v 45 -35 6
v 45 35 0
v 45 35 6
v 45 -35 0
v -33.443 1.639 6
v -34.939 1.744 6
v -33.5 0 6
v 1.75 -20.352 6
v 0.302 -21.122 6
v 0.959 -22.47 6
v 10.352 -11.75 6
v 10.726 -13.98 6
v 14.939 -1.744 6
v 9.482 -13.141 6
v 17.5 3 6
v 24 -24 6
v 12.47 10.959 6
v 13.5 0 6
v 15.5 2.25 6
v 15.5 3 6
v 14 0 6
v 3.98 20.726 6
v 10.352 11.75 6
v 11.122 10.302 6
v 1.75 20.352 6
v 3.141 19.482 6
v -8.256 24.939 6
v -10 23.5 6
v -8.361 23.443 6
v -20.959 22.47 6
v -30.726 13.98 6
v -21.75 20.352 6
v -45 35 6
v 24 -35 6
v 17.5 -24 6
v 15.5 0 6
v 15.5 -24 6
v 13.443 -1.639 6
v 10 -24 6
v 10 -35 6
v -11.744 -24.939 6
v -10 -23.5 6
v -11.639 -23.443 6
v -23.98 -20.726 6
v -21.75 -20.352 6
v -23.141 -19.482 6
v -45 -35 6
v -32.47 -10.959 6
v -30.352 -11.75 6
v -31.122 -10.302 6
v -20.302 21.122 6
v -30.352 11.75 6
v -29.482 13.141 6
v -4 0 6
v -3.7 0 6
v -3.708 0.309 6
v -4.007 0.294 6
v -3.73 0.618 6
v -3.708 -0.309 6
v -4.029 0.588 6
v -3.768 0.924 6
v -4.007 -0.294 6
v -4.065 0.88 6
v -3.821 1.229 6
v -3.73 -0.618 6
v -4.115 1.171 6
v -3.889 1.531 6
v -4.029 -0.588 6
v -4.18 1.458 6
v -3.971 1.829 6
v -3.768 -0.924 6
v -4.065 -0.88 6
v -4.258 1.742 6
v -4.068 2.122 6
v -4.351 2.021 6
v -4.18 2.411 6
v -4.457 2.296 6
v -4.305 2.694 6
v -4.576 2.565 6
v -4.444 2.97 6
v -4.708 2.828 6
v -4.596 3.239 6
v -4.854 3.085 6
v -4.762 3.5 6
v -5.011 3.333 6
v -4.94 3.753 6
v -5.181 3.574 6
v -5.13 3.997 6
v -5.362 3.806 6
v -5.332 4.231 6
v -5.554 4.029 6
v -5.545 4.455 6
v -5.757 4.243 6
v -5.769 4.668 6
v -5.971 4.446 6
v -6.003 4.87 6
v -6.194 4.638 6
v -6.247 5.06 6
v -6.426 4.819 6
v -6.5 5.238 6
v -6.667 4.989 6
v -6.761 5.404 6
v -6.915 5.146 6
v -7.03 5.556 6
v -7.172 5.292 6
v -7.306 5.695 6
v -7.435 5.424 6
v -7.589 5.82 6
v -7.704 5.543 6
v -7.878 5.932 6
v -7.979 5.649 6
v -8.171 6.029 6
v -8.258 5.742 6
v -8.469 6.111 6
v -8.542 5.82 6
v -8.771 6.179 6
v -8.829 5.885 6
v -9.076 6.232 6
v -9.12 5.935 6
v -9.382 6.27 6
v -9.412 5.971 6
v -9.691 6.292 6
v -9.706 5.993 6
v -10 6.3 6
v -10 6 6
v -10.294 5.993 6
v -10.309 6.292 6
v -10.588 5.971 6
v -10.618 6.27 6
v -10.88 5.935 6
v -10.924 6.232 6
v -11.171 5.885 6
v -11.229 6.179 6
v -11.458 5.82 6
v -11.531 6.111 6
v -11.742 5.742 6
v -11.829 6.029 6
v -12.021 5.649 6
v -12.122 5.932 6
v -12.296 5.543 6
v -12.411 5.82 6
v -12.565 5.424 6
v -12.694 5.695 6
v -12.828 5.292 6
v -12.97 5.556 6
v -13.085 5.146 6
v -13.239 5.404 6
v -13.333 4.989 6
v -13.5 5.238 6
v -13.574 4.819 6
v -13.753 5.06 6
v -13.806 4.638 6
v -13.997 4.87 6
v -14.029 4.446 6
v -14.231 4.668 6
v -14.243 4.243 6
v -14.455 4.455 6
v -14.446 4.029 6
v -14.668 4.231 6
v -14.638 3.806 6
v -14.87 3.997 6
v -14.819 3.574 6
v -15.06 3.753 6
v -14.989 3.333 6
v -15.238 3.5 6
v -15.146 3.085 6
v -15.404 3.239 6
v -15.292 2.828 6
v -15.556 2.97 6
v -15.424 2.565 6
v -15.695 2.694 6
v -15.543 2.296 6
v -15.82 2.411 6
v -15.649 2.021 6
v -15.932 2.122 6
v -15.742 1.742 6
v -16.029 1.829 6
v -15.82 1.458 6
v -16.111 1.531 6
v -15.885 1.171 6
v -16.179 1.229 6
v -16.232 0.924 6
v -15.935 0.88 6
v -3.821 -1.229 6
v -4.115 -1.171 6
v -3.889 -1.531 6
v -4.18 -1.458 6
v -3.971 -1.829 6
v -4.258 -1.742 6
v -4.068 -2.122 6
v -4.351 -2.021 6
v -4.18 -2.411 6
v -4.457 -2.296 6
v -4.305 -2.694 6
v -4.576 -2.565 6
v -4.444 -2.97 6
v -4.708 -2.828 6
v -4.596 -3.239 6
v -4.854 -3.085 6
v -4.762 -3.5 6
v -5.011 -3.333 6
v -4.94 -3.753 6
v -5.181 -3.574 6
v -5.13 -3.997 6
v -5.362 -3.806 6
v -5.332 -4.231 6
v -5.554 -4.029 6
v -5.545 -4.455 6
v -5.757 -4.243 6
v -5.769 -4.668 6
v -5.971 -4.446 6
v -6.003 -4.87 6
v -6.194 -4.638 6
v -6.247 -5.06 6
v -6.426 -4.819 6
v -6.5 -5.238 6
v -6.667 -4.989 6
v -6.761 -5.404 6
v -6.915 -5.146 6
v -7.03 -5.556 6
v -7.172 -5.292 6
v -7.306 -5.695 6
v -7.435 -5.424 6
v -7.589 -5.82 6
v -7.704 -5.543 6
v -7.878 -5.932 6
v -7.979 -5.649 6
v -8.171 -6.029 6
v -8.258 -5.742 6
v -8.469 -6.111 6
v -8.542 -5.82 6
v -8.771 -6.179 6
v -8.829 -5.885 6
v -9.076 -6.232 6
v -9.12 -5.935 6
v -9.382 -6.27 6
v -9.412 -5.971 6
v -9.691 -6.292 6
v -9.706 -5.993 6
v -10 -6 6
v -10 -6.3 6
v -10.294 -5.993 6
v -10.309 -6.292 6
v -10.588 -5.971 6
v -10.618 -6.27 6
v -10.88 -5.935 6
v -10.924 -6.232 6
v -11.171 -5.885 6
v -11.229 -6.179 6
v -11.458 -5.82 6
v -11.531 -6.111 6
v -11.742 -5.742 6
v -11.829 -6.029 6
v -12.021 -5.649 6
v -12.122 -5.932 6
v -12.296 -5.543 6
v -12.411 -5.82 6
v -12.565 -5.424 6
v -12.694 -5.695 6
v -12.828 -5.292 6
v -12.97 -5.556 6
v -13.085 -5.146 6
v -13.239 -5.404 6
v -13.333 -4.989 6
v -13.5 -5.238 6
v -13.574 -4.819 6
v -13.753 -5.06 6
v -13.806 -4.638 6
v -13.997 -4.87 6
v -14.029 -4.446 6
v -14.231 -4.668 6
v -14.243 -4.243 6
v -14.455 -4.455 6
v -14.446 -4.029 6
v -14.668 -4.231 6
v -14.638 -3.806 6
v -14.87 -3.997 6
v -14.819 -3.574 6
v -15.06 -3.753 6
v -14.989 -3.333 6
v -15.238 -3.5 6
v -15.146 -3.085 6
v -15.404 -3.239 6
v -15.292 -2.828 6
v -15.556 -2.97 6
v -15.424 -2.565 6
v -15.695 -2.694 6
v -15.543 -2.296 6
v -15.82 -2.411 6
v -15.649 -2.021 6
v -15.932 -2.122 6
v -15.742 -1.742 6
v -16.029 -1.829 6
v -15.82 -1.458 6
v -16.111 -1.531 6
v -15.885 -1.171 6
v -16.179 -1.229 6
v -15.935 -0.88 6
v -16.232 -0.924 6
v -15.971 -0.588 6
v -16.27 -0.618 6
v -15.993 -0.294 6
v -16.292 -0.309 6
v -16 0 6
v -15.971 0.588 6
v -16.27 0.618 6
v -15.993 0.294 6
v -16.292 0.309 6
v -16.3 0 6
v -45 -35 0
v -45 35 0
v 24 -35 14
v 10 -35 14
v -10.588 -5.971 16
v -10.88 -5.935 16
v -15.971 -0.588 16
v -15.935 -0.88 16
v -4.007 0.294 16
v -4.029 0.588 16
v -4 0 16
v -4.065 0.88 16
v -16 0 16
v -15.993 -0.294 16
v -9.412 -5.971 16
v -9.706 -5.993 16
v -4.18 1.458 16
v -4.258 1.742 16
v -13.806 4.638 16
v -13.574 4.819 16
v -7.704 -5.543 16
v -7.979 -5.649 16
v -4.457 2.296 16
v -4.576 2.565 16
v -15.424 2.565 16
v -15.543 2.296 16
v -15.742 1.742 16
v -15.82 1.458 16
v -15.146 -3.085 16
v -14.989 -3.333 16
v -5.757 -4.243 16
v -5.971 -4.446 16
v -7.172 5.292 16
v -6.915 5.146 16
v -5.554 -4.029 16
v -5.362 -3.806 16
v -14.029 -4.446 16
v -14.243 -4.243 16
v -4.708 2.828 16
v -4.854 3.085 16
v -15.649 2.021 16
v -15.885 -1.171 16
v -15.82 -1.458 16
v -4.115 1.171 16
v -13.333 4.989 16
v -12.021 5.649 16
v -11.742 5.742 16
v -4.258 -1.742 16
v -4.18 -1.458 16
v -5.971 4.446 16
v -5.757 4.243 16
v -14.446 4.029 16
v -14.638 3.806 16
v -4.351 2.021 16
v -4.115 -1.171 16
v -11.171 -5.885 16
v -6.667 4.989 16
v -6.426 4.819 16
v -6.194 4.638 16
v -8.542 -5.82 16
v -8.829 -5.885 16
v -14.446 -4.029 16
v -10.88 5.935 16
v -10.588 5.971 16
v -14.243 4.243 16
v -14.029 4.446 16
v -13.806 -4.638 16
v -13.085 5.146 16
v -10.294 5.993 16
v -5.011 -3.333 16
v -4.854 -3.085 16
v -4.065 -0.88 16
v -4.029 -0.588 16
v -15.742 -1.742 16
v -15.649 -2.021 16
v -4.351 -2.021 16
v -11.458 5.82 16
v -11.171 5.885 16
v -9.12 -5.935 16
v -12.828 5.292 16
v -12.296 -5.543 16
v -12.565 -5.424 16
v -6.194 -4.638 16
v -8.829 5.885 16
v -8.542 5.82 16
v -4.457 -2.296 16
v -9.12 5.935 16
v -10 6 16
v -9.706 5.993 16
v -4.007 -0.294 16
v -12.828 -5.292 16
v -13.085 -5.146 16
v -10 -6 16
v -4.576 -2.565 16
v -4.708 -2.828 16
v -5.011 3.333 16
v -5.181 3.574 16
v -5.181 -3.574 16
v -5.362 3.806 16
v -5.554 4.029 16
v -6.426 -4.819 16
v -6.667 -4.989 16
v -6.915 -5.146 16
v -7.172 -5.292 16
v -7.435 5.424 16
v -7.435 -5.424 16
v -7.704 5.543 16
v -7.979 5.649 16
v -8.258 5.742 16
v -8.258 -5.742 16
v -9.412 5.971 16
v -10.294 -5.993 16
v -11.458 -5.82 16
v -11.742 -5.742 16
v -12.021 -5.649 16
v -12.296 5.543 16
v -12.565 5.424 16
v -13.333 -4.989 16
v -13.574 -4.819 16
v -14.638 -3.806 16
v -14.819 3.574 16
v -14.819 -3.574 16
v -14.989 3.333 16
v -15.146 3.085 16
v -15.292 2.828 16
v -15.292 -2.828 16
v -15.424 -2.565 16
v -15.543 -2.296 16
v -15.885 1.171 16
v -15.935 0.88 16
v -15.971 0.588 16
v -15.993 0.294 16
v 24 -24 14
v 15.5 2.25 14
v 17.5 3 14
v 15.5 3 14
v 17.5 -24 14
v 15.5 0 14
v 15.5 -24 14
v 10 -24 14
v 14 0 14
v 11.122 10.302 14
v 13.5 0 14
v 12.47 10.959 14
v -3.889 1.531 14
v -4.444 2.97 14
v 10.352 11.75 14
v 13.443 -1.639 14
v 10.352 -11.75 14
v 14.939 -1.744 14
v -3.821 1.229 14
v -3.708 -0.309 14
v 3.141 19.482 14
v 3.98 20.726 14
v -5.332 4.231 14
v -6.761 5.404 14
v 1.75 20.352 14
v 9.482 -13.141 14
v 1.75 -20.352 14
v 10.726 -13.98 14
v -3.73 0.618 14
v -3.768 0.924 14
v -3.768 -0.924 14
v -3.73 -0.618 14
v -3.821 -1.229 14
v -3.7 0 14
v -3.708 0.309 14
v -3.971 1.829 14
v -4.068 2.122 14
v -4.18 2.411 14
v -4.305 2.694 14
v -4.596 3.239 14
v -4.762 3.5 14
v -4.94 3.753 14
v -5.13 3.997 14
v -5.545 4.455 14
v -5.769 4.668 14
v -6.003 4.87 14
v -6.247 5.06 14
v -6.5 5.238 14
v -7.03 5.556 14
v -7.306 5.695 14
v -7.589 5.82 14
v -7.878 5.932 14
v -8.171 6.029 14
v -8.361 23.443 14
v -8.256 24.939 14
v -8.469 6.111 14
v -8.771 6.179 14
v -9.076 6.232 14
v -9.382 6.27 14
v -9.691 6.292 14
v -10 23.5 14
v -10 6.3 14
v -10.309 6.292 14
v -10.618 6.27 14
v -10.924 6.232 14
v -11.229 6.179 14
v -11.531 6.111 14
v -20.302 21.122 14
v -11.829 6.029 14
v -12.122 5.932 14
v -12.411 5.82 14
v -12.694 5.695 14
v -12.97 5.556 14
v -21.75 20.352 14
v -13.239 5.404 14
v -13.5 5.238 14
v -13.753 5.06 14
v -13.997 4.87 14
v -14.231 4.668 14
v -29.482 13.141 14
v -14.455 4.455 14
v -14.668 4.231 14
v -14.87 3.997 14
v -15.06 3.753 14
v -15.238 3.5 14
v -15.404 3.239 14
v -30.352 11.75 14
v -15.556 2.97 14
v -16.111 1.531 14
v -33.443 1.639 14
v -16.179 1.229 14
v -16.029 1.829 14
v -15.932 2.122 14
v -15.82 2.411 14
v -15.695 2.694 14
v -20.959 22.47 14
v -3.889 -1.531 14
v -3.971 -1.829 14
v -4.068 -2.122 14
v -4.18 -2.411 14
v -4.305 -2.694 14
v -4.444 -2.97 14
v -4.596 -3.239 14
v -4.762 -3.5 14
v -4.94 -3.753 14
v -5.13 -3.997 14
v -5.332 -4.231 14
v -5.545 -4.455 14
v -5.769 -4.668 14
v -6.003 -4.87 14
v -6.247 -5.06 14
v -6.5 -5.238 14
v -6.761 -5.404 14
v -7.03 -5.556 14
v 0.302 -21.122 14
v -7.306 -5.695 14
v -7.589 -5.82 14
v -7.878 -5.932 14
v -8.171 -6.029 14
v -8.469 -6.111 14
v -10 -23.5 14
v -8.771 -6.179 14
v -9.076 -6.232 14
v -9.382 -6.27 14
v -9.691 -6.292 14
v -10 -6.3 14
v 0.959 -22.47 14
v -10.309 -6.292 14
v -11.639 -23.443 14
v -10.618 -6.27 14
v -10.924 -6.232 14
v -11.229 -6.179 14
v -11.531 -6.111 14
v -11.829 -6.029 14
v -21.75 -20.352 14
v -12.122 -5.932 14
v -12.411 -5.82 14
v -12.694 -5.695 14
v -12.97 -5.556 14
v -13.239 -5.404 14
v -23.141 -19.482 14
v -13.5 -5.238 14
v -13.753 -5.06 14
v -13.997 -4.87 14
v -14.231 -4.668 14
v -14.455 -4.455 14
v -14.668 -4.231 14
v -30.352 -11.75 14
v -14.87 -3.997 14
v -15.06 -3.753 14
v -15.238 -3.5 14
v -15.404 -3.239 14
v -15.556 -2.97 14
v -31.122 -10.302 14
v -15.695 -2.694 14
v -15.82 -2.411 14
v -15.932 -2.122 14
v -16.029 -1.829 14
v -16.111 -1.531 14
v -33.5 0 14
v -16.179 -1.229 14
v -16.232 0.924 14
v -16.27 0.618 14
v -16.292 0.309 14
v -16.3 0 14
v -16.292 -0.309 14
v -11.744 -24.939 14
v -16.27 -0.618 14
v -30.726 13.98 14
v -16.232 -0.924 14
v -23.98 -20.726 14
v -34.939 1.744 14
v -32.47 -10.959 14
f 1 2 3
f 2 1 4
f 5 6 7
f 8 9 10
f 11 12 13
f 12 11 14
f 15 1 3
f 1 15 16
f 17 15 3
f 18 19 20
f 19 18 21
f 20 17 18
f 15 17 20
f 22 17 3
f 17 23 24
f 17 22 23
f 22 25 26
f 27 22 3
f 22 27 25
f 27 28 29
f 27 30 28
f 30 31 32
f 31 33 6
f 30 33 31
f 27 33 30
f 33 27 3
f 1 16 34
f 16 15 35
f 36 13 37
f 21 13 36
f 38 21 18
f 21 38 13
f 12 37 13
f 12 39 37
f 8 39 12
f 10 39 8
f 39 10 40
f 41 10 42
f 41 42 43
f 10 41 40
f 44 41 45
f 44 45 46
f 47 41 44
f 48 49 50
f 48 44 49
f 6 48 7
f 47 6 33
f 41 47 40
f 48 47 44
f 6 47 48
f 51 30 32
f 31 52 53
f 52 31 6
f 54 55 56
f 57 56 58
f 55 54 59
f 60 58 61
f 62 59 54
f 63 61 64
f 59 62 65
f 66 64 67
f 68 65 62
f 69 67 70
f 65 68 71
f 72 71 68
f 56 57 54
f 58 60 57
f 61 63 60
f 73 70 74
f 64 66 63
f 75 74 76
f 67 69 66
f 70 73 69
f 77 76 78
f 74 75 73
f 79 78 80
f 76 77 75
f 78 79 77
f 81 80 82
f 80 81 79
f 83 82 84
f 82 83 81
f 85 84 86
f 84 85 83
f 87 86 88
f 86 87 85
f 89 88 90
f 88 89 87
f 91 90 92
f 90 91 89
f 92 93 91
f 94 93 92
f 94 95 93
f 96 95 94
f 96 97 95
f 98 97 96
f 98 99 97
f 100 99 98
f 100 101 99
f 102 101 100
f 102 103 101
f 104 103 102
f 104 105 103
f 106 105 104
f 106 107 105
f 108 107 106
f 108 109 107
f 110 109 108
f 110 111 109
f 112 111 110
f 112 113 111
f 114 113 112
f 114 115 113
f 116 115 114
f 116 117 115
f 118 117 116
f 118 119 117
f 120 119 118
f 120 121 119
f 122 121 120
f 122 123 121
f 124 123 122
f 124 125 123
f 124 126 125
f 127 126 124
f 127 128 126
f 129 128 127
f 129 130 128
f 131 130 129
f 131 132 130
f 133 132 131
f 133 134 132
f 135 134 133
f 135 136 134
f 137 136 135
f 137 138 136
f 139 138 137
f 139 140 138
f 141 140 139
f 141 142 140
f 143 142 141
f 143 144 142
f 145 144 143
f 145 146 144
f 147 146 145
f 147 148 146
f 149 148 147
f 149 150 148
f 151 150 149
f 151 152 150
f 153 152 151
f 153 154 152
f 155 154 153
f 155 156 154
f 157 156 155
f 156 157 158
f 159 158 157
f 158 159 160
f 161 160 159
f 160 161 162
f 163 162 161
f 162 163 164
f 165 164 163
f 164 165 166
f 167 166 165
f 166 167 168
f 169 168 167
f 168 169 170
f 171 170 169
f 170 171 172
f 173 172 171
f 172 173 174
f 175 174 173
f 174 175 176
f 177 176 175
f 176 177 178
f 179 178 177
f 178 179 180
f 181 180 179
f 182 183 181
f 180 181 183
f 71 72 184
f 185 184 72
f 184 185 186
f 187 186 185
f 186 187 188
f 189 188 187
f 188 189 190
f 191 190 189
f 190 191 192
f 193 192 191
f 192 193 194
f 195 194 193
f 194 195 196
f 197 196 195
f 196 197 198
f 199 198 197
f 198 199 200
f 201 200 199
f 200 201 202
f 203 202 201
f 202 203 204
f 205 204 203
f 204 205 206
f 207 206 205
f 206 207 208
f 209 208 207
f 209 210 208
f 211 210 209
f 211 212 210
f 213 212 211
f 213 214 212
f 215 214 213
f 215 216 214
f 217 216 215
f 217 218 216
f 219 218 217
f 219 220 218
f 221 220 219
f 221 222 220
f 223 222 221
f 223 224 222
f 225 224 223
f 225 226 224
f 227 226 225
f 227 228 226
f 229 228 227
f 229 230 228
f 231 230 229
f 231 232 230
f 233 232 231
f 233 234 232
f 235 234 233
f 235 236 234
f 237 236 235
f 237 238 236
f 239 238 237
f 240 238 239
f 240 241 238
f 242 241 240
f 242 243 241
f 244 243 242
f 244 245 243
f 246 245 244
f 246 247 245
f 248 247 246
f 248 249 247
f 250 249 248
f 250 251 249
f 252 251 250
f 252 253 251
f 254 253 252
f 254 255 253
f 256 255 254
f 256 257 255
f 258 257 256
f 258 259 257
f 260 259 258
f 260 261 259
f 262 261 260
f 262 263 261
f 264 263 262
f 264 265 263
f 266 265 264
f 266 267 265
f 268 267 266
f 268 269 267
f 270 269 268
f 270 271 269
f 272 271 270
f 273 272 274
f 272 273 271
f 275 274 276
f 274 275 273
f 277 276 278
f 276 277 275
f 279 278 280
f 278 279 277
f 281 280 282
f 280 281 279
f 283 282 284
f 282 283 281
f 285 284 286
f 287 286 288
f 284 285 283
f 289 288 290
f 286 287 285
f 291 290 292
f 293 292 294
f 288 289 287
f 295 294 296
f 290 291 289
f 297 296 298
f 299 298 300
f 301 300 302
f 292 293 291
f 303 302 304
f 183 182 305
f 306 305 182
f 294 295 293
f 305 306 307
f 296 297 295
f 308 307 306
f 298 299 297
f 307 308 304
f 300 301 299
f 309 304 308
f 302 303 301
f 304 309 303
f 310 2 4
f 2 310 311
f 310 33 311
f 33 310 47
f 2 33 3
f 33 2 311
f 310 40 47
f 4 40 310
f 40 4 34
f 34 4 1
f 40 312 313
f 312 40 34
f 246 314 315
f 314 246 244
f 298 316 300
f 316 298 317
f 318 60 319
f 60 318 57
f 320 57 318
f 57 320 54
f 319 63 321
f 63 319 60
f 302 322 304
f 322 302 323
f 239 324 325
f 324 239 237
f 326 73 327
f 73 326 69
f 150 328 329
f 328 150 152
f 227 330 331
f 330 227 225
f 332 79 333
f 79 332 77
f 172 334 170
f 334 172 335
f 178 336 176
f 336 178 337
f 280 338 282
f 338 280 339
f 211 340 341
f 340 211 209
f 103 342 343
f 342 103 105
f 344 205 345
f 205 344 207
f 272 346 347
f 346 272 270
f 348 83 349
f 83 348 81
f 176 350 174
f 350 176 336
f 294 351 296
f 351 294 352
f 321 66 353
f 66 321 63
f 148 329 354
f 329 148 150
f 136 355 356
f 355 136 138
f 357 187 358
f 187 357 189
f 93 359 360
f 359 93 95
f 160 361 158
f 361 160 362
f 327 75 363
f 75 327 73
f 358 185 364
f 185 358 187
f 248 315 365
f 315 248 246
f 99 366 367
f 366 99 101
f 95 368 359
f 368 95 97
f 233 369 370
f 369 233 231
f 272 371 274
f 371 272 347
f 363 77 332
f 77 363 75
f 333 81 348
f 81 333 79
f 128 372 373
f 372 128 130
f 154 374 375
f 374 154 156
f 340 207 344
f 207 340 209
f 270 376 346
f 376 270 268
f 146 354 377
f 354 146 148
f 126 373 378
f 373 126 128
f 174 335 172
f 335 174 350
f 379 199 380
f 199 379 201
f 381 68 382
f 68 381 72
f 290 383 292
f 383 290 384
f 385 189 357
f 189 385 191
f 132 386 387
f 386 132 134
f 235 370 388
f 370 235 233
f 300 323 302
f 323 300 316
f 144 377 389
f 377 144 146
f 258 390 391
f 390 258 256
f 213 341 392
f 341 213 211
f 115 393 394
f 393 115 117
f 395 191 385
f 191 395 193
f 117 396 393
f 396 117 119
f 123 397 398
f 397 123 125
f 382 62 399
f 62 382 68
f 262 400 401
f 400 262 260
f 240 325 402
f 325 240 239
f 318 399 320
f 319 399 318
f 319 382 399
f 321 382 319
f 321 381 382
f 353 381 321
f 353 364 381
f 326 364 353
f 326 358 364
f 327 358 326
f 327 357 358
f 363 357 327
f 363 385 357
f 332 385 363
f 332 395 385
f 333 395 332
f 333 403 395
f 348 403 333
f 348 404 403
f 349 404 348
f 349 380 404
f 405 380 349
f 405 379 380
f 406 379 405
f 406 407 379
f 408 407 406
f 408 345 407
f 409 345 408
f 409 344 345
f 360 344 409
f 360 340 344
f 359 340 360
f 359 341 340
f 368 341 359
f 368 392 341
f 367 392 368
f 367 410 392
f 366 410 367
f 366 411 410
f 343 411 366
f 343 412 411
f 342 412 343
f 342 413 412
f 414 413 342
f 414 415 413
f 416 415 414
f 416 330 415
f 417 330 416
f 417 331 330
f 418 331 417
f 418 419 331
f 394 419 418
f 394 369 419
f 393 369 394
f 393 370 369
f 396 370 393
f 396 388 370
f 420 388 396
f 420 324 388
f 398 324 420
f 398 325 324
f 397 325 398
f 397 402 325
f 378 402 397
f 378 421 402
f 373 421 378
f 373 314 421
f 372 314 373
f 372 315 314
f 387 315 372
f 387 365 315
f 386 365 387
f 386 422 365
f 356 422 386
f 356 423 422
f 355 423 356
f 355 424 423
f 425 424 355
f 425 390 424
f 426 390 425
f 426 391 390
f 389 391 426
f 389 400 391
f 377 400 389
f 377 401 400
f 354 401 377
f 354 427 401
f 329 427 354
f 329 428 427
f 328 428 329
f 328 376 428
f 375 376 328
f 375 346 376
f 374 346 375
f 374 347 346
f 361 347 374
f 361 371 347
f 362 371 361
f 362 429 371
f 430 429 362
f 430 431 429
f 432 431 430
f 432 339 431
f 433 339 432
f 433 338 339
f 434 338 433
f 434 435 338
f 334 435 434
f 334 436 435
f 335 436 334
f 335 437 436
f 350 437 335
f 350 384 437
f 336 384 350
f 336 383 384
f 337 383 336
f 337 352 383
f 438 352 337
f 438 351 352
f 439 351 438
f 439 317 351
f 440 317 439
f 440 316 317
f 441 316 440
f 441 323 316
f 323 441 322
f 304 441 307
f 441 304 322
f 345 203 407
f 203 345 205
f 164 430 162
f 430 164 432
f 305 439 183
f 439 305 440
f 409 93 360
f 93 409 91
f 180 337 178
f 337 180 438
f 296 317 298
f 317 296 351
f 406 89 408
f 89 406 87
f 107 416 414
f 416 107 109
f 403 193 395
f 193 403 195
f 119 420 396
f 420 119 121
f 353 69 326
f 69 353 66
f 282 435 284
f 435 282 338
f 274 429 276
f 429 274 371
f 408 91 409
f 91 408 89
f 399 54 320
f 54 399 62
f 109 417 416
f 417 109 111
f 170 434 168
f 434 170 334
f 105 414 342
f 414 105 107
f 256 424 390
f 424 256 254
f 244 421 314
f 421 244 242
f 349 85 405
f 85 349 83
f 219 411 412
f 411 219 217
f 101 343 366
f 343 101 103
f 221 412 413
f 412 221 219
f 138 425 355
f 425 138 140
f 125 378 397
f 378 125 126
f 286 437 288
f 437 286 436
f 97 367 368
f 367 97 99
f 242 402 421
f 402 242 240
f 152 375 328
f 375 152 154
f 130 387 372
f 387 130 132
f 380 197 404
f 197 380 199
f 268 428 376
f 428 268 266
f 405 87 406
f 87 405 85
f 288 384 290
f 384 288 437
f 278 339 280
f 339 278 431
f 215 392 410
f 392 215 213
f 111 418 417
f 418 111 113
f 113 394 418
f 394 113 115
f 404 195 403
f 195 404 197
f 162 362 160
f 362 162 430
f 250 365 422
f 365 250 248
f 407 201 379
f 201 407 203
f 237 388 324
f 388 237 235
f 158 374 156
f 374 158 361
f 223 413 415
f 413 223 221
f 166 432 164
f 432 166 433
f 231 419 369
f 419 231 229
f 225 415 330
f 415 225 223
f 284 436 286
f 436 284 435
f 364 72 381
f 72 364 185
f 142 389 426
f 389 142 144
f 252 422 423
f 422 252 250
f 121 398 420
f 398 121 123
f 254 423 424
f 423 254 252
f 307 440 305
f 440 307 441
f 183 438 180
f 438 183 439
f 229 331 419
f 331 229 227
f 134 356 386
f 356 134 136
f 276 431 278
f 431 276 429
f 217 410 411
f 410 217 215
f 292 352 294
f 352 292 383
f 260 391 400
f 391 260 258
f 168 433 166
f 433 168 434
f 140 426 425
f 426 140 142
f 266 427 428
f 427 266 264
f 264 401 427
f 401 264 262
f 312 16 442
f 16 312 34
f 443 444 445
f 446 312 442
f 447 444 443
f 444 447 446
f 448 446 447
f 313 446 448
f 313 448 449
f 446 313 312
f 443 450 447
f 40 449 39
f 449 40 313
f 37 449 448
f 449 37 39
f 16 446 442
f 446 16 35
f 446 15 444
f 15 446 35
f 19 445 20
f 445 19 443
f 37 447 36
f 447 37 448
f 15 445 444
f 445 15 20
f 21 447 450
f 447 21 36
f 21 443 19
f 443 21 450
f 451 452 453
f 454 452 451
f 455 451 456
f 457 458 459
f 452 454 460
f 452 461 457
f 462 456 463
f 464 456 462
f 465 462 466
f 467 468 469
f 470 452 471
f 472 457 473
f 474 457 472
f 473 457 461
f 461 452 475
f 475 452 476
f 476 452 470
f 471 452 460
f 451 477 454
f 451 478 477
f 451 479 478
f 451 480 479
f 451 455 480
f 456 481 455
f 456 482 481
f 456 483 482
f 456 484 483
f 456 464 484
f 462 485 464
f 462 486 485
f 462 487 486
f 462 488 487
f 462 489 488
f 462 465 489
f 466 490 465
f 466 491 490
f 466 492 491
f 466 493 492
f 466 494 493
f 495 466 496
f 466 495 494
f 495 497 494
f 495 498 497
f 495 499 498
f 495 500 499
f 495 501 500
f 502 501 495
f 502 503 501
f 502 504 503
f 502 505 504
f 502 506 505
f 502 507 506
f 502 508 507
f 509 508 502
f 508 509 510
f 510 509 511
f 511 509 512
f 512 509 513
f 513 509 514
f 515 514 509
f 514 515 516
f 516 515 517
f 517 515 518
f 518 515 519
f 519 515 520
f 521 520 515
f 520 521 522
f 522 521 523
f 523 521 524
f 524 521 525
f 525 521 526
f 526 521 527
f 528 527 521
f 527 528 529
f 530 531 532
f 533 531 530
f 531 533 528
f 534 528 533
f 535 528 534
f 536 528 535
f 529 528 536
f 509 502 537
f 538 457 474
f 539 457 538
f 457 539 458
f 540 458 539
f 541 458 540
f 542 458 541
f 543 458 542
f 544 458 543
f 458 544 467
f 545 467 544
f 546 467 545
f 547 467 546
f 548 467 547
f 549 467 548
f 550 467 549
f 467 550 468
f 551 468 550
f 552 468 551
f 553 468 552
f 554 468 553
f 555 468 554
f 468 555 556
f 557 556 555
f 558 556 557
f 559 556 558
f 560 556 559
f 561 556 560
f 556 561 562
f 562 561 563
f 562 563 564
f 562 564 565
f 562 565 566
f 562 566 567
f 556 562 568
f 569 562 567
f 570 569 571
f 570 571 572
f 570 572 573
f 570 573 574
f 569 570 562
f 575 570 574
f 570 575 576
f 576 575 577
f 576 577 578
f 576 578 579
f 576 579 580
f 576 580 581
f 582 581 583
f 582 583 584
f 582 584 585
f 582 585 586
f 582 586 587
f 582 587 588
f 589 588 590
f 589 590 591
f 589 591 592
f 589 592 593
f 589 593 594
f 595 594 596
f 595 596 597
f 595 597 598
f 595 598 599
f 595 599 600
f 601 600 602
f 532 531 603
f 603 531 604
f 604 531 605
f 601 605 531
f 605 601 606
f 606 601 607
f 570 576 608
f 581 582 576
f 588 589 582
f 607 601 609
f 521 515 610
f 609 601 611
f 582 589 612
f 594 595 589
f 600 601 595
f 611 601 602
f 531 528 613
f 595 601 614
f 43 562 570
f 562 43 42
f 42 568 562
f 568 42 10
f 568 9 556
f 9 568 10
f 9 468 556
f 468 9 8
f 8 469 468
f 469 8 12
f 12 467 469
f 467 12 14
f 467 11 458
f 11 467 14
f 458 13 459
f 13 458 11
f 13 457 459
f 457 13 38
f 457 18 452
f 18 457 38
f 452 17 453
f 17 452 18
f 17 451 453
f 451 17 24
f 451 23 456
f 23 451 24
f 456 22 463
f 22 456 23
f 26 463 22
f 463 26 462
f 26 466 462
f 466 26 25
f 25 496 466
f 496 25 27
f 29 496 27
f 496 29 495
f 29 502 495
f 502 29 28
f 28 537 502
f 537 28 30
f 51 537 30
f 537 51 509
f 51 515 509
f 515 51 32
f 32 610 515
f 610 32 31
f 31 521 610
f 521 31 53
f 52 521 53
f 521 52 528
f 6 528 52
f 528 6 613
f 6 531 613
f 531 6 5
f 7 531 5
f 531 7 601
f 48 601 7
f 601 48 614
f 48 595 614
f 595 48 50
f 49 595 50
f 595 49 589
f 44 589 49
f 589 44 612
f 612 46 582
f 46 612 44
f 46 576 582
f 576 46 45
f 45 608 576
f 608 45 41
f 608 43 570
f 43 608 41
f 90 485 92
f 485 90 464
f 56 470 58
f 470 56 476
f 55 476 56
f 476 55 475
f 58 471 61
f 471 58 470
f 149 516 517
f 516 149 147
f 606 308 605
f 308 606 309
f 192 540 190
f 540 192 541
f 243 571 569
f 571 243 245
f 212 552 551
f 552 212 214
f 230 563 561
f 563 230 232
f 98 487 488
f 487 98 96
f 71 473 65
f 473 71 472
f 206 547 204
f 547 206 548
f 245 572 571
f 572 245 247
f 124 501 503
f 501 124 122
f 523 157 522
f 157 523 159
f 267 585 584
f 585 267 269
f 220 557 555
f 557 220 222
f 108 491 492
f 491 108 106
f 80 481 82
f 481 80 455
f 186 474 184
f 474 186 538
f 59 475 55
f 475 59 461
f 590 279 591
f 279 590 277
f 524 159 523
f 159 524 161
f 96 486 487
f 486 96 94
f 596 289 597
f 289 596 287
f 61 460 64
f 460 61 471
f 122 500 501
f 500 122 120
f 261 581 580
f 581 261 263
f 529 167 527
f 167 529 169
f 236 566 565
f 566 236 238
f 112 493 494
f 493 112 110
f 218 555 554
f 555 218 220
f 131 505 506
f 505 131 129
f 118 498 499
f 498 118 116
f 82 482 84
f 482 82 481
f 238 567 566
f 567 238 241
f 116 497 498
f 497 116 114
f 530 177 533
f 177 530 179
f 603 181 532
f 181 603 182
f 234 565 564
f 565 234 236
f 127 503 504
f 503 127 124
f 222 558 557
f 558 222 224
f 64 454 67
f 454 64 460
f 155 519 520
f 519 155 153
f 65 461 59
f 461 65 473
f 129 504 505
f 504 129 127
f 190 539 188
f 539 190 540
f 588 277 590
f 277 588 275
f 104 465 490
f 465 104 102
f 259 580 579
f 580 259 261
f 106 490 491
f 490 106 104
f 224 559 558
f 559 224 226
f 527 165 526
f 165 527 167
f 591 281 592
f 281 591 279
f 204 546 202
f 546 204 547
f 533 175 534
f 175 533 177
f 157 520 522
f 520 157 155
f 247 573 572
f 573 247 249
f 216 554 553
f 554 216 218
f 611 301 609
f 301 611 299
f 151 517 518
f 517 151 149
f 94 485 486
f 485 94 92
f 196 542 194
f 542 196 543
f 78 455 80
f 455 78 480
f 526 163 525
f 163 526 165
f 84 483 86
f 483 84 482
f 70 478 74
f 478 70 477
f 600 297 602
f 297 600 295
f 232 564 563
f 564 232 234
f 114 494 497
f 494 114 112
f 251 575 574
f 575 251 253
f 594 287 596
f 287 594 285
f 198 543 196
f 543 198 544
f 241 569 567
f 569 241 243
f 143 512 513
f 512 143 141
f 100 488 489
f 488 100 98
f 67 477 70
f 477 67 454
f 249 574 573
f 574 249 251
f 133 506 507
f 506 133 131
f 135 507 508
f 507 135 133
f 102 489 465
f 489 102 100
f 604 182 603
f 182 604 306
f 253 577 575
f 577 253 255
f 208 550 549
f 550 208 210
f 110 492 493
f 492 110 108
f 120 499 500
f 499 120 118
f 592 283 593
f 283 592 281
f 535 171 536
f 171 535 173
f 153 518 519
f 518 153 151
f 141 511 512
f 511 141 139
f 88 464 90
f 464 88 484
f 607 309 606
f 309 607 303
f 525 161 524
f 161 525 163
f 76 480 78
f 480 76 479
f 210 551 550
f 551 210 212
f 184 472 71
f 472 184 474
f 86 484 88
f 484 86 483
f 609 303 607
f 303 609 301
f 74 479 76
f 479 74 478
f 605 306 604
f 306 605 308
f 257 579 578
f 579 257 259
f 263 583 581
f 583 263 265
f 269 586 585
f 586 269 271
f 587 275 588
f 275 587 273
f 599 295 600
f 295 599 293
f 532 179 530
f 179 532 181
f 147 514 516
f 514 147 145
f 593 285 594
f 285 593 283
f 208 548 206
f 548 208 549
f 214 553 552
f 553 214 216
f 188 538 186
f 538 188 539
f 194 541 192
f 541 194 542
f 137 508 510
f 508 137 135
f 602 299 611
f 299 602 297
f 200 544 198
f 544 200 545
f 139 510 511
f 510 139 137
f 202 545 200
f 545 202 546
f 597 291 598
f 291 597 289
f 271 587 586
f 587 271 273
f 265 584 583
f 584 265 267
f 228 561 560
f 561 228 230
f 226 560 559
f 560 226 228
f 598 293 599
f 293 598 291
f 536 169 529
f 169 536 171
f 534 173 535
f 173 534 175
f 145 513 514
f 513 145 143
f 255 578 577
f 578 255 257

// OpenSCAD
/* Ratchet wheel with spring pawl - PLA, 0.4 nozzle, no supports */
// Wheel ~50mm dia, 12 teeth. Free clockwise (from above), locks CCW.
// Print orientation: both parts flat, +Z up, bottom on bed.

/* [Part] */
part = "assembly"; // [wheel, base, assembly]
cadverify_only = "";
module instance(name, part, unit = 1) {
    echo(cadverify_instance = [name, part, unit]);
    if (cadverify_only == "" || cadverify_only == name) children();
}

// ---- parameters (mm) ----
Ro = 25;            // wheel tip radius (dia 50)
Rr = 23.5;          // wheel root radius (tooth height 1.5)
Nteeth = 12;
pitch = 360/Nteeth; // 30
gentle_span = 26;   // valley->tip CCW (gentle ramp)
wheel_t = 8;        // wheel thickness
bore_d = 12.6;      // wheel bore
post_d = 12;        // post diameter
post_h = 10;        // post height above base top
base_x = 90;
base_y = 70;
base_t = 6;
wheel_cx = -10;     // post/wheel centre in base coords
wheel_cy = 0;
base_top = base_t;  // 6
// pawl / arm
beam_x0 = 15.5; beam_x1 = 17.5;   // beam 2mm thick in X
beam_y0 = -30; beam_y1 = 3;       // beam length
beam_z0 = 6; beam_z1 = 14;        // beam height 8
tip_x = 14.0;       // pawl tip westmost (1.0 inside tip circle: 25-24=1.0)

$fn = 128;

// ---- wheel: centred at (0,0), bottom z=0 ----
module wheel() {
    difference() {
        linear_extrude(height = wheel_t, convexity = 4)
            polygon(points = [ for (i = [0:Nteeth-1]) each [
                [Rr*cos(i*pitch), Rr*sin(i*pitch)],
                [Ro*cos(i*pitch+gentle_span), Ro*sin(i*pitch+gentle_span)],
                [Rr*cos(i*pitch+gentle_span), Rr*sin(i*pitch+gentle_span)]
            ]]);
        translate([0,0,-1]) cylinder(d = bore_d, h = wheel_t+2);
    }
}

// ---- base: plate centred at origin, bottom z=0, post at (wheel_cx,wheel_cy) ----
module base() {
    union() {
        // plate
        translate([-base_x/2, -base_y/2, 0]) cube([base_x, base_y, base_t]);
        // post
        translate([wheel_cx, wheel_cy, base_top]) cylinder(d = post_d, h = post_h);
        // anchor block
        translate([10, -35, 6]) cube([14, 11, 8]);
        // flexible beam (2mm thick, ~33mm long, 8mm tall)
        translate([beam_x0, beam_y0, beam_z0]) cube([beam_x1-beam_x0, beam_y1-beam_y0, beam_z1-beam_z0]);
        // pawl tip wedge: tip (tip_x,0), overlap 0.5 into beam; north ramp, south flat
        linear_extrude(height = 8, convexity = 2)
            polygon(points = [[tip_x,0],[16,0],[16,3]]);
        // shift pawl wedge up to beam height (extrude from 0 -> translate)
    }
}

// pawl wedge is extruded 0..8, need to lift to 6..14: wrap
module base_fixed() {
    union() {
        translate([-base_x/2, -base_y/2, 0]) cube([base_x, base_y, base_t]);
        translate([wheel_cx, wheel_cy, base_top]) cylinder(d = post_d, h = post_h);
        translate([10, -35, 6]) cube([14, 11, 8]);
        translate([beam_x0, beam_y0, beam_z0]) cube([beam_x1-beam_x0, beam_y1-beam_y0, beam_z1-beam_z0]);
        translate([0,0,6]) linear_extrude(height = 8, convexity = 2)
            polygon(points = [[tip_x,0],[16,0],[16,3]]);
    }
}

// ---- specs ----
if (part == "wheel") echo(cadverify_spec = [
    ["bounds", [[-Ro, -Ro, 0], [Ro, Ro, wheel_t]]],
    ["bodies", 1],
    ["through_holes", 1],
    ["support_faces", [["bed", "-z", 1000]]],
    ["overhangs_allowed", []],
    ["copies", 1],
    ["details", [
        ["bore", "hole", [0, 0, 10], [0, 0, -1], [[0, bore_d], [wheel_t-0.5, bore_d]]],
        ["rim", "thickness", [0, 15, 10], [0, 0, -1], wheel_t],
        ["tooth", "material", [[20.5, 5.5, 0], [22.5, 8.5, wheel_t]], 0.5],
        ["teeth", "view", [[20, -25, 0], [Ro, 25, wheel_t]]]
    ]]
]);

if (part == "base") echo(cadverify_spec = [
    ["bounds", [[-base_x/2, -base_y/2, 0], [base_x/2, base_y/2, base_top+post_h]]],
    ["bodies", 1],
    ["support_faces", [["bed", "-z", 4000]]],
    ["overhangs_allowed", []],
    ["copies", 1],
    ["details", [
        ["plate", "thickness", [-30, 20, 10], [0, 0, -1], base_t],
        ["post", "material", [[wheel_cx-6, wheel_cy-6, base_top], [wheel_cx+6, wheel_cy+6, base_top+post_h]], 0.5],
        ["arm", "material", [[beam_x0, beam_y0, beam_z0], [beam_x1, beam_y1, beam_z1]], 0.9],
        ["pawl_tip", "view", [[14.0, -1, 6], [16, 3.5, 14]]]
    ]]
]);

if (part == "assembly") echo(cadverify_spec = [
    ["bounds", [[-base_x/2, -base_y/2, 0], [base_x/2, base_y/2, base_top+post_h]]],
    ["motions", [
        ["click", ["wheel1"], "rotate", [wheel_cx, wheel_cy, base_top], [0, 0, 1], [0, -360]]
    ]],
    ["assembly_order", [
        [["base1"], [0, 0, 0]],
        [["wheel1"], [0, 0, -30]]
    ]]
]);

// ---- geometry dispatch ----
if (part == "wheel") wheel();
else if (part == "base") base_fixed();
else if (part == "assembly") {
    instance("base1", "base") base_fixed();
    instance("wheel1", "wheel") translate([wheel_cx, wheel_cy, base_top]) wheel();
}
